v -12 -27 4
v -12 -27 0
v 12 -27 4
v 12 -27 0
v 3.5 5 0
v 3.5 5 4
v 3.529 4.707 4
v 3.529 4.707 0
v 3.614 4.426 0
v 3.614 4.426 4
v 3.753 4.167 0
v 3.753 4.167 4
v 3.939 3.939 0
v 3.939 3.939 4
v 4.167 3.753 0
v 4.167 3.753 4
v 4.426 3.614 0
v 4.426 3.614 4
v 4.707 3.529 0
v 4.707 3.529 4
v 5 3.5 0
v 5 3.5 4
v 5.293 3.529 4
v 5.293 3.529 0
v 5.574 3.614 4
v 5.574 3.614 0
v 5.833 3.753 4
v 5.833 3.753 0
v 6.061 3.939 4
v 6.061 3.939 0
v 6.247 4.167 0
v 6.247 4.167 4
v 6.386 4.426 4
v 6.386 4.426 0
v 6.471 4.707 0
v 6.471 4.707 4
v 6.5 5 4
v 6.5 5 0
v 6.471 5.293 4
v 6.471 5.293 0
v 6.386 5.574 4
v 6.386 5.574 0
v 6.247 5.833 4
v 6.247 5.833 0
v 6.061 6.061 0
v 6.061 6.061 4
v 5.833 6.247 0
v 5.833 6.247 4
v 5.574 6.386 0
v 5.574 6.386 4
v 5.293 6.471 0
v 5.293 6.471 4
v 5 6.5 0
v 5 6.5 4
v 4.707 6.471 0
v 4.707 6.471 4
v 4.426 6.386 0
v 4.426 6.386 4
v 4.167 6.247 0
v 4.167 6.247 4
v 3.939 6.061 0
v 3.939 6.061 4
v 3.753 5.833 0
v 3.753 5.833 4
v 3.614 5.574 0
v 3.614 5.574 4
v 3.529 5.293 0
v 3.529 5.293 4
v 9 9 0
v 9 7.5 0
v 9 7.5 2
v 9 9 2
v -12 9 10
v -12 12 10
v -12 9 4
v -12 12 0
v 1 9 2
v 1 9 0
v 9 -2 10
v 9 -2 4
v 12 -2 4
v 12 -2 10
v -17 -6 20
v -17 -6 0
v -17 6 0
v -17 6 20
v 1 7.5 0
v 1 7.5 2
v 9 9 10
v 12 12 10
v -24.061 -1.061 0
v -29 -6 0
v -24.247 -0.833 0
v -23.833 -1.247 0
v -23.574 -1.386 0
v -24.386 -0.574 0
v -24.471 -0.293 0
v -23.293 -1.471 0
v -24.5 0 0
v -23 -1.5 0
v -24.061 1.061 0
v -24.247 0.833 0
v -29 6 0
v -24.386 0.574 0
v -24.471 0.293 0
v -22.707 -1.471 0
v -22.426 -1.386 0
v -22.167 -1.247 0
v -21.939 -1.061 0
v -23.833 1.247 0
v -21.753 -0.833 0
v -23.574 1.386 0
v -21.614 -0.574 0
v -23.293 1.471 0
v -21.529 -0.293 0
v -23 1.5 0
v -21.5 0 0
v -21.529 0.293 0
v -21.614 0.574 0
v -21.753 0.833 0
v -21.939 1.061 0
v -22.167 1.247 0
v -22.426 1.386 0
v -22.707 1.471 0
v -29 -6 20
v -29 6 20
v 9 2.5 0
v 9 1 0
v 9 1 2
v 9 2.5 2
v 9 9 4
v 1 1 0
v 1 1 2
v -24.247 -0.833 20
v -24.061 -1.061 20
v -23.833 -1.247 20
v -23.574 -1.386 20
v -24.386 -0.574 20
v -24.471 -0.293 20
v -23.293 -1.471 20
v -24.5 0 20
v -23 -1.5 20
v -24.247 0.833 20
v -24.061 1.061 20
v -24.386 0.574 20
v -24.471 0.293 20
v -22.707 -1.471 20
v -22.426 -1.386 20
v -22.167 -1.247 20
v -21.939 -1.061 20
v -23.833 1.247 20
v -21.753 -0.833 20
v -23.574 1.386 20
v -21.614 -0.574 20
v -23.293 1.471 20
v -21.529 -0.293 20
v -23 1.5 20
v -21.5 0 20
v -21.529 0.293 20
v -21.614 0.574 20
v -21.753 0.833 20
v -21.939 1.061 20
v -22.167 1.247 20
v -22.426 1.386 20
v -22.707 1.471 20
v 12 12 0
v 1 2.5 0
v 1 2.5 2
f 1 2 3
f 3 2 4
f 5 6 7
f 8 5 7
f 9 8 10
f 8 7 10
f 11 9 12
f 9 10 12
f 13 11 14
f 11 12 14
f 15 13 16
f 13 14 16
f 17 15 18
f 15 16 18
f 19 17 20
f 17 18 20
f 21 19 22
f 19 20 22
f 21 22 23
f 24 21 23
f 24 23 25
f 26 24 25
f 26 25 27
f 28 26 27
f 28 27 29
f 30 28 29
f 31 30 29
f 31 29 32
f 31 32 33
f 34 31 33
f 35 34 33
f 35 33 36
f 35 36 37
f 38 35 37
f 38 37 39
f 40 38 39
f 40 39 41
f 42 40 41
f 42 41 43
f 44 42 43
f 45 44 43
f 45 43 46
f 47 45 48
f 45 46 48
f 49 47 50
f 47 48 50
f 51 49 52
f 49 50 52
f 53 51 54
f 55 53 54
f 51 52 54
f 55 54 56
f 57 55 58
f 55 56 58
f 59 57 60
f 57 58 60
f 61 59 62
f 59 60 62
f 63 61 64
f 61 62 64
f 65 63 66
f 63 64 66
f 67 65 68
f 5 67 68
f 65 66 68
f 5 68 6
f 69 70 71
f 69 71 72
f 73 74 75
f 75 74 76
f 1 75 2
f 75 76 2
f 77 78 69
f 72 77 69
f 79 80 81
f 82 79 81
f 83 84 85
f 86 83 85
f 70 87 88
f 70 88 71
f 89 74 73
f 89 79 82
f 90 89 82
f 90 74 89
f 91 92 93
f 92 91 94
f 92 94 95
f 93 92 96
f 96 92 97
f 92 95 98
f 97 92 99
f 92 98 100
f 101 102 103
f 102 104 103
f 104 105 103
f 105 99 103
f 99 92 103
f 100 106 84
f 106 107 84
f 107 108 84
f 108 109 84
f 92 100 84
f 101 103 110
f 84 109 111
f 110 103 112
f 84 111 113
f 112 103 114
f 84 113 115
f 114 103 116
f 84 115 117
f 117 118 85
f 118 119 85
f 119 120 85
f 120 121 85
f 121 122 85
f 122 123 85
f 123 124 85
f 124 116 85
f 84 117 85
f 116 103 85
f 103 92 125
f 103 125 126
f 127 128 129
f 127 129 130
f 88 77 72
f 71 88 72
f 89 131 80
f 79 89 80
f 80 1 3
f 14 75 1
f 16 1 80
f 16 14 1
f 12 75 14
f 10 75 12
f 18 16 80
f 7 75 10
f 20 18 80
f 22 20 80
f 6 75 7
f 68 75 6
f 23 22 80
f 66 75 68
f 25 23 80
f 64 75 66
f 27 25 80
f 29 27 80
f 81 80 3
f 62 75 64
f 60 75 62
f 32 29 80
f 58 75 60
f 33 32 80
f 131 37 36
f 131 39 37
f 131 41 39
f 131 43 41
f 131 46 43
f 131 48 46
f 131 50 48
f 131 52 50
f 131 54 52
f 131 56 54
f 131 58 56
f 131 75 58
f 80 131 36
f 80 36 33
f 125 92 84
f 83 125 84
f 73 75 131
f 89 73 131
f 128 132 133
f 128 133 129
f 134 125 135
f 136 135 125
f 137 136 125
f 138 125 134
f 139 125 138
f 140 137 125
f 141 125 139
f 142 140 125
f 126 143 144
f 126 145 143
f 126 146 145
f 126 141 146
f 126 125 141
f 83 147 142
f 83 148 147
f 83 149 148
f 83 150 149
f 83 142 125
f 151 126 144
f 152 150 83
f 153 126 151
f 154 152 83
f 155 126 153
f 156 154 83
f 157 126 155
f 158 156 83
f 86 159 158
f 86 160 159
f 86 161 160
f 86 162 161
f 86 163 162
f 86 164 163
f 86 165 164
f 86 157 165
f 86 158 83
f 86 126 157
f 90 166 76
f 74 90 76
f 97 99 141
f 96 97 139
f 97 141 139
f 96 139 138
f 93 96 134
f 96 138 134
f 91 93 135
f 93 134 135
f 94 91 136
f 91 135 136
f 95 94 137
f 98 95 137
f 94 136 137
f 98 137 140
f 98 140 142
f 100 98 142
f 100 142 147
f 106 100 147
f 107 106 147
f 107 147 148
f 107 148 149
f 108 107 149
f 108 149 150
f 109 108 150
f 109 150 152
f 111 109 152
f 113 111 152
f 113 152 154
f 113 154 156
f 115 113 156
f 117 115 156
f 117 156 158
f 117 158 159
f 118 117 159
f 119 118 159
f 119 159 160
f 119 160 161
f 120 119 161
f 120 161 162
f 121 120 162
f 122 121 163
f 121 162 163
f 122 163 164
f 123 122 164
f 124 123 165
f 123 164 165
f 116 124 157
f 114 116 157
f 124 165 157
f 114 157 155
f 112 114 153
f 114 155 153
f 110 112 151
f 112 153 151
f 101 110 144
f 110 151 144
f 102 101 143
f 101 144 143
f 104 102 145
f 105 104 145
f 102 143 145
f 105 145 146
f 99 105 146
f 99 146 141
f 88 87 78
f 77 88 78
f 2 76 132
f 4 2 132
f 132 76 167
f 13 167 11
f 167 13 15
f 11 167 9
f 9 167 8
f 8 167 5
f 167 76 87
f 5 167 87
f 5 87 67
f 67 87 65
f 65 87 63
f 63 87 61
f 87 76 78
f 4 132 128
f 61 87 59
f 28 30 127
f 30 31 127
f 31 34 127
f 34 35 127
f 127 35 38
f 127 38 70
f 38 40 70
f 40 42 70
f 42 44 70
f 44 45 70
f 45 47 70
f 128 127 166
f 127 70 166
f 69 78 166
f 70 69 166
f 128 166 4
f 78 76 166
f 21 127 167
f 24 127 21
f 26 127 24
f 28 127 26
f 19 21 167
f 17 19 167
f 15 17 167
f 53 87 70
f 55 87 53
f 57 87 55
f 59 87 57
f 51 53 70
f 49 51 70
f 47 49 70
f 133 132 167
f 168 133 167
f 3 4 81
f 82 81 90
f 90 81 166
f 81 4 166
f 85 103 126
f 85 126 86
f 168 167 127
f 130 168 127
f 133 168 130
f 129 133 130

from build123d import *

# Parameters (mm, degrees)
F0_W     = 24
F0_H     = 24
F0_H_2   = 15
F1_DEPTH = 4
F3_DEPTH = 6
F4_W     = 8
F4_H     = 1.5
F5_DEPTH = 2
F6_D     = 3
F7_W     = 12
F7_H     = 12
F8_DEPTH = 20
F10_D    = 3


with BuildPart() as f1:
    # F0 (on Top) → F1 (new body)
    with BuildSketch(Plane.XY):
        Rectangle(F0_W, F0_H)
        with Locations((0, -19.5)):
            Rectangle(F0_W, F0_H_2)
    extrude(amount=F1_DEPTH)

    # F2 (on face) → F3 (join)
    with BuildSketch(Plane.XY.offset(4)):
        Polygon((12, 12), (-12, 12), (-12, 9), (9, 9), (9, -2), (12, -2), align=None)
    extrude(amount=F3_DEPTH)

    # F4 (on face) → F5 (cut)
    with BuildSketch(Plane.XY):
        with Locations((5, 1.75)):
            Rectangle(F4_W, F4_H)
        with Locations((5, 8.25)):
            Rectangle(F4_W, F4_H)
    extrude(amount=F5_DEPTH, mode=Mode.SUBTRACT)

    # F6 (through all)
    with Locations(Plane(origin=(0, 0, 0), x_dir=(1, 0, 0), z_dir=(0, 0, -1))):
        with Locations((5, -5)):
            Hole(F6_D / 2)


with BuildPart() as f8:
    # F7 (on Top) → F8 (new body)
    with BuildSketch(Plane.XY):
        with Locations((-23, 0)):
            Rectangle(F7_W, F7_H)
    extrude(amount=F8_DEPTH)

    # F10 (through all)
    with Locations(Plane(origin=(0, 0, 0), x_dir=(1, 0, 0), z_dir=(0, 0, -1))):
        with Locations((-23, 0)):
            Hole(F10_D / 2)


solid = Compound([f1.part, f8.part])
